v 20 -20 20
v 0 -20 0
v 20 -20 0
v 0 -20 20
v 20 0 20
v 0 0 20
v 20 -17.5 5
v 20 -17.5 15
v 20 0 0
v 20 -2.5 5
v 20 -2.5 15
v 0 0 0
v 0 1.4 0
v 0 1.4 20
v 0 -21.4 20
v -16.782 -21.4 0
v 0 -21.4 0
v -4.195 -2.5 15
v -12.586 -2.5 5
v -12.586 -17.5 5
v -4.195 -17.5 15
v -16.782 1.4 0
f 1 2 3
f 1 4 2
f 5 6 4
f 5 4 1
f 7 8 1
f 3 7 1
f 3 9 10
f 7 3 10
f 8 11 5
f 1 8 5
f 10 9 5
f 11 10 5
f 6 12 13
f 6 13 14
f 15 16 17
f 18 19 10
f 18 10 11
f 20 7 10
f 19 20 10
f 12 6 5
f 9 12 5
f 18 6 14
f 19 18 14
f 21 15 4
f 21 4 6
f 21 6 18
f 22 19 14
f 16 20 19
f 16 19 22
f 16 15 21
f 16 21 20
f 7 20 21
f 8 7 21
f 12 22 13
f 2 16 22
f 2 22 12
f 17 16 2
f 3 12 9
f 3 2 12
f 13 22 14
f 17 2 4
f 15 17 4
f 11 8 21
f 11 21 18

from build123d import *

# Parameters (mm, degrees)
F0_W          = 20
F0_H          = 20
F1_DEPTH      = 20
F2_DEPTH      = 21.4
F2_DEPTH_BACK = 1.4
F3_W          = 15
F3_H          = 10
F4_DEPTH      = 36.782993


with BuildPart() as f1:
    # F0 (on Front) → F1 (new body)
    with BuildSketch(Plane.XZ):
        with Locations((10, 10)):
            Rectangle(F0_W, F0_H)
        Polygon((-16.781993, 0), (0, 0), (0, 20), align=None)
    extrude(amount=F1_DEPTH)

    # F0 (on Front) → F2 (join, two sides)
    with BuildSketch(Plane.XZ) as f2_sk:
        Polygon((-16.781993, 0), (0, 0), (0, 20), align=None)
    extrude(amount=F2_DEPTH)
    extrude(f2_sk.sketch, amount=-F2_DEPTH_BACK)

    # F3 (on face) → F4 (cut, through all)
    with BuildSketch(Plane.YZ.offset(20)):
        with Locations((-10, 10)):
            Rectangle(F3_W, F3_H)
    extrude(amount=-F4_DEPTH, mode=Mode.SUBTRACT)


solid = f1.part
